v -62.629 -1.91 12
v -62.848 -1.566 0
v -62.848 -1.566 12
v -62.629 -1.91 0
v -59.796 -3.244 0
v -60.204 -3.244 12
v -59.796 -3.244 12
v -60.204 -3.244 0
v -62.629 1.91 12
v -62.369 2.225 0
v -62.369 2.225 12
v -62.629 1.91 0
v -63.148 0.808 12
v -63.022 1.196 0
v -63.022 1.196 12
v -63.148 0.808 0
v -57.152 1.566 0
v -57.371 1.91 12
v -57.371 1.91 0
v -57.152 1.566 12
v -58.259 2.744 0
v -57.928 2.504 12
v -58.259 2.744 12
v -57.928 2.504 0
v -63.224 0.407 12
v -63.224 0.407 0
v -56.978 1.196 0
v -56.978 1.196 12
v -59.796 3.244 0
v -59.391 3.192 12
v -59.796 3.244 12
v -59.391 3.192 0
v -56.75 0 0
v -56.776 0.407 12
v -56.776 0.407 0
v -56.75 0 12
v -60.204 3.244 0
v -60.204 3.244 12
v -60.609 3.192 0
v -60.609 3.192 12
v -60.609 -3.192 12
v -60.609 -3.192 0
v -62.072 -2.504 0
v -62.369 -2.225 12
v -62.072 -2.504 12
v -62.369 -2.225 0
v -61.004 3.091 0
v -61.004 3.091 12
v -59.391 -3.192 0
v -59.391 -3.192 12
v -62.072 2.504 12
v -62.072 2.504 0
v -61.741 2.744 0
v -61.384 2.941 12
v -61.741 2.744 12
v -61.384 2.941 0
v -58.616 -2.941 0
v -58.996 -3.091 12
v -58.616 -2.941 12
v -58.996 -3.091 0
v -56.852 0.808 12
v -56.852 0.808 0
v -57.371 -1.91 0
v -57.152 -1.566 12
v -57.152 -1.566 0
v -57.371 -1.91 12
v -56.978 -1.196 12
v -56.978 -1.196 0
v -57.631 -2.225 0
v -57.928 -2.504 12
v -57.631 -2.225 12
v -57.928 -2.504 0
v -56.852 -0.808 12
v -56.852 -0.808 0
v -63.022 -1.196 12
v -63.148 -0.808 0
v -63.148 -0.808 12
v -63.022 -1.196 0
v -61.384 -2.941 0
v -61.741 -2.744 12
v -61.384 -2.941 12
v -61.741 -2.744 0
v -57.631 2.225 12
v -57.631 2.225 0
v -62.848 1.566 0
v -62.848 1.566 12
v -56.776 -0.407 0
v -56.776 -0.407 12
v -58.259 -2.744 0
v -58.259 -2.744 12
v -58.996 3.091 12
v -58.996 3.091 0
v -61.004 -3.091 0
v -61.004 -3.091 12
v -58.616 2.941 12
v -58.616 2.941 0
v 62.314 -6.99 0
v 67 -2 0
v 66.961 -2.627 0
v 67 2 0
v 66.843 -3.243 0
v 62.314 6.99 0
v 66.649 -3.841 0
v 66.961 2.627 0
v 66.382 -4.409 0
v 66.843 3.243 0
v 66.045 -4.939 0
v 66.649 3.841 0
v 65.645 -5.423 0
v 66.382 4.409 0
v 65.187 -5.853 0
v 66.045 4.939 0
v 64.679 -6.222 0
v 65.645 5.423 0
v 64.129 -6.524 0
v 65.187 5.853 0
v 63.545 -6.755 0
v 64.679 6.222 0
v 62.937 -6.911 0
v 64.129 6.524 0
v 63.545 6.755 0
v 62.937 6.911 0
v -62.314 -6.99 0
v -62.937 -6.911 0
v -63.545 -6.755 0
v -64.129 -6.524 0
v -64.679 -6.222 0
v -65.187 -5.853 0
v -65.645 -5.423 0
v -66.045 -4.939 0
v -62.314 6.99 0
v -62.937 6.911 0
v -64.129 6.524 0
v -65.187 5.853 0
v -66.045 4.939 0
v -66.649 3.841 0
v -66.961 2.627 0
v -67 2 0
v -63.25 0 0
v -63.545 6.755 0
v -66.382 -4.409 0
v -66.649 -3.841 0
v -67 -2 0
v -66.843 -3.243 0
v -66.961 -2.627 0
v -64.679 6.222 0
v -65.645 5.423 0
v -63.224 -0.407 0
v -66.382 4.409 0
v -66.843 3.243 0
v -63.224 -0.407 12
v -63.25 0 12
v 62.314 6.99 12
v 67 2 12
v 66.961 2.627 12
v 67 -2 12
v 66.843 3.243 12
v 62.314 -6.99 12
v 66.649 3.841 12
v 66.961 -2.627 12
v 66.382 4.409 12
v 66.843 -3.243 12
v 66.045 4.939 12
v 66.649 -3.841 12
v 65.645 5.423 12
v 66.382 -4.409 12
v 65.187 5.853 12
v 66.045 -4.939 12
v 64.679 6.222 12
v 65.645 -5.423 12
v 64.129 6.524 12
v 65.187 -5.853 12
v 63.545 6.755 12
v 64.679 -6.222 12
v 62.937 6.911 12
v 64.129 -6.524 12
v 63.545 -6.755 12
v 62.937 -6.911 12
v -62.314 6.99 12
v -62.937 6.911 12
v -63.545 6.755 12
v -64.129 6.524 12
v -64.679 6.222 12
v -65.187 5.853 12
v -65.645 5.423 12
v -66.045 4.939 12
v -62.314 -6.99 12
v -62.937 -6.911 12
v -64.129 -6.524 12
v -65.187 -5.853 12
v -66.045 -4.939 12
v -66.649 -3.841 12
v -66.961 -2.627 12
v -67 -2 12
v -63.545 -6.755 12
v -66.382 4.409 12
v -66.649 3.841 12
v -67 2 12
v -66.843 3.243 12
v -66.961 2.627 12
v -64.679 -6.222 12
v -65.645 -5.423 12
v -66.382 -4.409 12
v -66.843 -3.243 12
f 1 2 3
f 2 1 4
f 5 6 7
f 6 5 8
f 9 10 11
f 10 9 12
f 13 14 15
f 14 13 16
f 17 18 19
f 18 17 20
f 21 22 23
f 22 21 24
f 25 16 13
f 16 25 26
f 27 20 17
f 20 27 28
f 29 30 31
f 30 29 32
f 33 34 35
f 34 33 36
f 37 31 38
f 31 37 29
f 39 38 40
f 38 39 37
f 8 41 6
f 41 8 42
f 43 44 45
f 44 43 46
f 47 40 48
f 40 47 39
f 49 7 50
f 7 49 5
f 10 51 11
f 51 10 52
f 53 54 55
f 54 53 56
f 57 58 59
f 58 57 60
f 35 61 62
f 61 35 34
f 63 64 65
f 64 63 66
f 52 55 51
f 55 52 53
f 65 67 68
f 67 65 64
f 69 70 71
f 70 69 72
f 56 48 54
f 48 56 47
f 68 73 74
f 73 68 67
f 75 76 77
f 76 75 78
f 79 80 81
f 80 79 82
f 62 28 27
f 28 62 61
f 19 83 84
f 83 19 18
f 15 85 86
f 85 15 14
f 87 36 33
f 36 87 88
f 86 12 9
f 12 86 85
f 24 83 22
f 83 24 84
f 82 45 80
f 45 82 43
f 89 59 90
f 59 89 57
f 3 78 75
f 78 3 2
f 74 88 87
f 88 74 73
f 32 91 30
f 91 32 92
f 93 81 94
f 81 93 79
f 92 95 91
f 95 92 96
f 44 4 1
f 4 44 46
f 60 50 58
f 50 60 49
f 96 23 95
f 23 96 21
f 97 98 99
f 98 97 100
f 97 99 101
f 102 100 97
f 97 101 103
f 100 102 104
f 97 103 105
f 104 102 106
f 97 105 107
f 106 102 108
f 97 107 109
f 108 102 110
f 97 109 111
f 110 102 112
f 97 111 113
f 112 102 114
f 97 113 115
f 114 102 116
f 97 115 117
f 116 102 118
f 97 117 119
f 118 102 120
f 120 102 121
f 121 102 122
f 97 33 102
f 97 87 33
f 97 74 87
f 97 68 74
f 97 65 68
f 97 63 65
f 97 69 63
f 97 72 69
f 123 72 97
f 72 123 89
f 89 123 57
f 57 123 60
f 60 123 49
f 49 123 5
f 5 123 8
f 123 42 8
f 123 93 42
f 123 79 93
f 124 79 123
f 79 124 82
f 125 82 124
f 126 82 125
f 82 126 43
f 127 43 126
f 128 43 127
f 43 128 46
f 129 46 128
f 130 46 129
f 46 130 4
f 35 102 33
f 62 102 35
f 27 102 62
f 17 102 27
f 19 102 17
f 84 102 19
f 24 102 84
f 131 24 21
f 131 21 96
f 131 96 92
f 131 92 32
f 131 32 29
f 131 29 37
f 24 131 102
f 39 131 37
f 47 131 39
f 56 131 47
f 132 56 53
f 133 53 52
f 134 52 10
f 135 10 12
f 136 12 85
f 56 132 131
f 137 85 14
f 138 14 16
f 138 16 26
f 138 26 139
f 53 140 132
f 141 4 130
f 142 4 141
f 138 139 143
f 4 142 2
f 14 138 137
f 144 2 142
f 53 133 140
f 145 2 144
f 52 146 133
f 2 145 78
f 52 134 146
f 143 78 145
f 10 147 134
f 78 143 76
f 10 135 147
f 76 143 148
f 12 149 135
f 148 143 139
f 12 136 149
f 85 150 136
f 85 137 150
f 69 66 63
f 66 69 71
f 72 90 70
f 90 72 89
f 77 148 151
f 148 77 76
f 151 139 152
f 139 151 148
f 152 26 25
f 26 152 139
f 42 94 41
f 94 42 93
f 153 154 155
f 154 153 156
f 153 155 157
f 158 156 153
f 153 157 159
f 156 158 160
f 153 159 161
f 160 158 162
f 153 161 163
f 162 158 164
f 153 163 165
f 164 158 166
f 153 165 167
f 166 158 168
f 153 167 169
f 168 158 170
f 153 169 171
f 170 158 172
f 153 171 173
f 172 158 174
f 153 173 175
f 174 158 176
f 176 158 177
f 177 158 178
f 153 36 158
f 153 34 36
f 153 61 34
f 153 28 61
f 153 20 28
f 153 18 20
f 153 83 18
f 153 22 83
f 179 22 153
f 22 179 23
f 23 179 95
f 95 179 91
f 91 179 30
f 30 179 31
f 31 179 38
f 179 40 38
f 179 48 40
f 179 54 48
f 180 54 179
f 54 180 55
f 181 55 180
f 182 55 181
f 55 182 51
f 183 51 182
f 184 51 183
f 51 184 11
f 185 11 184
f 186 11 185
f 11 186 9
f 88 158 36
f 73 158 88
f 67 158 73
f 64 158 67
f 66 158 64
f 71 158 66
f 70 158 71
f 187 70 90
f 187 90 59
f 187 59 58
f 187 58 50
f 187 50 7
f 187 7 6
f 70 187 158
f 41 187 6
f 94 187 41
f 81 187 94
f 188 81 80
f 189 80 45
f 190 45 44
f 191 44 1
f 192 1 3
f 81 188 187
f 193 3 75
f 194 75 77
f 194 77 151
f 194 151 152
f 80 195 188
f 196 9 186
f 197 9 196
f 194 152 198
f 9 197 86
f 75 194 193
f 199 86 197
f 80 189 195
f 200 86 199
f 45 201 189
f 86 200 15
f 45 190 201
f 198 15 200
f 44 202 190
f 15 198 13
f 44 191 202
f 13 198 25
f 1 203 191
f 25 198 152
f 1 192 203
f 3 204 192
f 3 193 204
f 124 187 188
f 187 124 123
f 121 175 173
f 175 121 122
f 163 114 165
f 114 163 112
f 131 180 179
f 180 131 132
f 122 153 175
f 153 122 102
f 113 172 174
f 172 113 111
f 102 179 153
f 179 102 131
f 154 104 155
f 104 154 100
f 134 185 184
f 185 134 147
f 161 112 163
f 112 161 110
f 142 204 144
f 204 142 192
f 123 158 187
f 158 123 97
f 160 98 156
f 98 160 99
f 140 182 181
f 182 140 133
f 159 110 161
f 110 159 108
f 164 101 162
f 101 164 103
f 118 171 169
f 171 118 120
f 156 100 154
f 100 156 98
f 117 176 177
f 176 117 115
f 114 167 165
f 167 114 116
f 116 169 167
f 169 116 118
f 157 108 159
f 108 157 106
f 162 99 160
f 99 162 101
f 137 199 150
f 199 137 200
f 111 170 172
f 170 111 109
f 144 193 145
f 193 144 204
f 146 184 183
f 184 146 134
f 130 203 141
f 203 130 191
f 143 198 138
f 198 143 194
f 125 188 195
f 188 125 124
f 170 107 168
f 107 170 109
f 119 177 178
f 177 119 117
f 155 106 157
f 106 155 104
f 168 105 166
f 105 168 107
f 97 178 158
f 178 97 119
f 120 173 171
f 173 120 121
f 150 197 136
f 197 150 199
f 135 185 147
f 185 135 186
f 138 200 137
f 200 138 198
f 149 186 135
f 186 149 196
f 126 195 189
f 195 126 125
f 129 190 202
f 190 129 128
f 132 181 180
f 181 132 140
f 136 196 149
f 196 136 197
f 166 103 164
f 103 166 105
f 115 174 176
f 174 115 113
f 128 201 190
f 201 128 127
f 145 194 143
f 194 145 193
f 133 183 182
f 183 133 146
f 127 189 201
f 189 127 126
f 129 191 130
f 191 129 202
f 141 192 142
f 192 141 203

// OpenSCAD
$fn = 50;


difference() {
	union() {
		hull() {
			translate(v = [-62.0000000000, 2.0000000000, 0]) {
				cylinder(h = 12, r = 5);
			}
			translate(v = [62.0000000000, 2.0000000000, 0]) {
				cylinder(h = 12, r = 5);
			}
			translate(v = [-62.0000000000, -2.0000000000, 0]) {
				cylinder(h = 12, r = 5);
			}
			translate(v = [62.0000000000, -2.0000000000, 0]) {
				cylinder(h = 12, r = 5);
			}
		}
	}
	union() {
		translate(v = [-60.0000000000, 0.0000000000, 0]) {
			cylinder(h = 12, r = 3.2500000000);
		}
		translate(v = [-60.0000000000, 0.0000000000, 0]) {
			cylinder(h = 12, r = 1.8000000000);
		}
		translate(v = [-60.0000000000, 0.0000000000, 0]) {
			cylinder(h = 12, r = 1.8000000000);
		}
		translate(v = [-60.0000000000, 0.0000000000, 0]) {
			cylinder(h = 12, r = 1.8000000000);
		}
	}
}
